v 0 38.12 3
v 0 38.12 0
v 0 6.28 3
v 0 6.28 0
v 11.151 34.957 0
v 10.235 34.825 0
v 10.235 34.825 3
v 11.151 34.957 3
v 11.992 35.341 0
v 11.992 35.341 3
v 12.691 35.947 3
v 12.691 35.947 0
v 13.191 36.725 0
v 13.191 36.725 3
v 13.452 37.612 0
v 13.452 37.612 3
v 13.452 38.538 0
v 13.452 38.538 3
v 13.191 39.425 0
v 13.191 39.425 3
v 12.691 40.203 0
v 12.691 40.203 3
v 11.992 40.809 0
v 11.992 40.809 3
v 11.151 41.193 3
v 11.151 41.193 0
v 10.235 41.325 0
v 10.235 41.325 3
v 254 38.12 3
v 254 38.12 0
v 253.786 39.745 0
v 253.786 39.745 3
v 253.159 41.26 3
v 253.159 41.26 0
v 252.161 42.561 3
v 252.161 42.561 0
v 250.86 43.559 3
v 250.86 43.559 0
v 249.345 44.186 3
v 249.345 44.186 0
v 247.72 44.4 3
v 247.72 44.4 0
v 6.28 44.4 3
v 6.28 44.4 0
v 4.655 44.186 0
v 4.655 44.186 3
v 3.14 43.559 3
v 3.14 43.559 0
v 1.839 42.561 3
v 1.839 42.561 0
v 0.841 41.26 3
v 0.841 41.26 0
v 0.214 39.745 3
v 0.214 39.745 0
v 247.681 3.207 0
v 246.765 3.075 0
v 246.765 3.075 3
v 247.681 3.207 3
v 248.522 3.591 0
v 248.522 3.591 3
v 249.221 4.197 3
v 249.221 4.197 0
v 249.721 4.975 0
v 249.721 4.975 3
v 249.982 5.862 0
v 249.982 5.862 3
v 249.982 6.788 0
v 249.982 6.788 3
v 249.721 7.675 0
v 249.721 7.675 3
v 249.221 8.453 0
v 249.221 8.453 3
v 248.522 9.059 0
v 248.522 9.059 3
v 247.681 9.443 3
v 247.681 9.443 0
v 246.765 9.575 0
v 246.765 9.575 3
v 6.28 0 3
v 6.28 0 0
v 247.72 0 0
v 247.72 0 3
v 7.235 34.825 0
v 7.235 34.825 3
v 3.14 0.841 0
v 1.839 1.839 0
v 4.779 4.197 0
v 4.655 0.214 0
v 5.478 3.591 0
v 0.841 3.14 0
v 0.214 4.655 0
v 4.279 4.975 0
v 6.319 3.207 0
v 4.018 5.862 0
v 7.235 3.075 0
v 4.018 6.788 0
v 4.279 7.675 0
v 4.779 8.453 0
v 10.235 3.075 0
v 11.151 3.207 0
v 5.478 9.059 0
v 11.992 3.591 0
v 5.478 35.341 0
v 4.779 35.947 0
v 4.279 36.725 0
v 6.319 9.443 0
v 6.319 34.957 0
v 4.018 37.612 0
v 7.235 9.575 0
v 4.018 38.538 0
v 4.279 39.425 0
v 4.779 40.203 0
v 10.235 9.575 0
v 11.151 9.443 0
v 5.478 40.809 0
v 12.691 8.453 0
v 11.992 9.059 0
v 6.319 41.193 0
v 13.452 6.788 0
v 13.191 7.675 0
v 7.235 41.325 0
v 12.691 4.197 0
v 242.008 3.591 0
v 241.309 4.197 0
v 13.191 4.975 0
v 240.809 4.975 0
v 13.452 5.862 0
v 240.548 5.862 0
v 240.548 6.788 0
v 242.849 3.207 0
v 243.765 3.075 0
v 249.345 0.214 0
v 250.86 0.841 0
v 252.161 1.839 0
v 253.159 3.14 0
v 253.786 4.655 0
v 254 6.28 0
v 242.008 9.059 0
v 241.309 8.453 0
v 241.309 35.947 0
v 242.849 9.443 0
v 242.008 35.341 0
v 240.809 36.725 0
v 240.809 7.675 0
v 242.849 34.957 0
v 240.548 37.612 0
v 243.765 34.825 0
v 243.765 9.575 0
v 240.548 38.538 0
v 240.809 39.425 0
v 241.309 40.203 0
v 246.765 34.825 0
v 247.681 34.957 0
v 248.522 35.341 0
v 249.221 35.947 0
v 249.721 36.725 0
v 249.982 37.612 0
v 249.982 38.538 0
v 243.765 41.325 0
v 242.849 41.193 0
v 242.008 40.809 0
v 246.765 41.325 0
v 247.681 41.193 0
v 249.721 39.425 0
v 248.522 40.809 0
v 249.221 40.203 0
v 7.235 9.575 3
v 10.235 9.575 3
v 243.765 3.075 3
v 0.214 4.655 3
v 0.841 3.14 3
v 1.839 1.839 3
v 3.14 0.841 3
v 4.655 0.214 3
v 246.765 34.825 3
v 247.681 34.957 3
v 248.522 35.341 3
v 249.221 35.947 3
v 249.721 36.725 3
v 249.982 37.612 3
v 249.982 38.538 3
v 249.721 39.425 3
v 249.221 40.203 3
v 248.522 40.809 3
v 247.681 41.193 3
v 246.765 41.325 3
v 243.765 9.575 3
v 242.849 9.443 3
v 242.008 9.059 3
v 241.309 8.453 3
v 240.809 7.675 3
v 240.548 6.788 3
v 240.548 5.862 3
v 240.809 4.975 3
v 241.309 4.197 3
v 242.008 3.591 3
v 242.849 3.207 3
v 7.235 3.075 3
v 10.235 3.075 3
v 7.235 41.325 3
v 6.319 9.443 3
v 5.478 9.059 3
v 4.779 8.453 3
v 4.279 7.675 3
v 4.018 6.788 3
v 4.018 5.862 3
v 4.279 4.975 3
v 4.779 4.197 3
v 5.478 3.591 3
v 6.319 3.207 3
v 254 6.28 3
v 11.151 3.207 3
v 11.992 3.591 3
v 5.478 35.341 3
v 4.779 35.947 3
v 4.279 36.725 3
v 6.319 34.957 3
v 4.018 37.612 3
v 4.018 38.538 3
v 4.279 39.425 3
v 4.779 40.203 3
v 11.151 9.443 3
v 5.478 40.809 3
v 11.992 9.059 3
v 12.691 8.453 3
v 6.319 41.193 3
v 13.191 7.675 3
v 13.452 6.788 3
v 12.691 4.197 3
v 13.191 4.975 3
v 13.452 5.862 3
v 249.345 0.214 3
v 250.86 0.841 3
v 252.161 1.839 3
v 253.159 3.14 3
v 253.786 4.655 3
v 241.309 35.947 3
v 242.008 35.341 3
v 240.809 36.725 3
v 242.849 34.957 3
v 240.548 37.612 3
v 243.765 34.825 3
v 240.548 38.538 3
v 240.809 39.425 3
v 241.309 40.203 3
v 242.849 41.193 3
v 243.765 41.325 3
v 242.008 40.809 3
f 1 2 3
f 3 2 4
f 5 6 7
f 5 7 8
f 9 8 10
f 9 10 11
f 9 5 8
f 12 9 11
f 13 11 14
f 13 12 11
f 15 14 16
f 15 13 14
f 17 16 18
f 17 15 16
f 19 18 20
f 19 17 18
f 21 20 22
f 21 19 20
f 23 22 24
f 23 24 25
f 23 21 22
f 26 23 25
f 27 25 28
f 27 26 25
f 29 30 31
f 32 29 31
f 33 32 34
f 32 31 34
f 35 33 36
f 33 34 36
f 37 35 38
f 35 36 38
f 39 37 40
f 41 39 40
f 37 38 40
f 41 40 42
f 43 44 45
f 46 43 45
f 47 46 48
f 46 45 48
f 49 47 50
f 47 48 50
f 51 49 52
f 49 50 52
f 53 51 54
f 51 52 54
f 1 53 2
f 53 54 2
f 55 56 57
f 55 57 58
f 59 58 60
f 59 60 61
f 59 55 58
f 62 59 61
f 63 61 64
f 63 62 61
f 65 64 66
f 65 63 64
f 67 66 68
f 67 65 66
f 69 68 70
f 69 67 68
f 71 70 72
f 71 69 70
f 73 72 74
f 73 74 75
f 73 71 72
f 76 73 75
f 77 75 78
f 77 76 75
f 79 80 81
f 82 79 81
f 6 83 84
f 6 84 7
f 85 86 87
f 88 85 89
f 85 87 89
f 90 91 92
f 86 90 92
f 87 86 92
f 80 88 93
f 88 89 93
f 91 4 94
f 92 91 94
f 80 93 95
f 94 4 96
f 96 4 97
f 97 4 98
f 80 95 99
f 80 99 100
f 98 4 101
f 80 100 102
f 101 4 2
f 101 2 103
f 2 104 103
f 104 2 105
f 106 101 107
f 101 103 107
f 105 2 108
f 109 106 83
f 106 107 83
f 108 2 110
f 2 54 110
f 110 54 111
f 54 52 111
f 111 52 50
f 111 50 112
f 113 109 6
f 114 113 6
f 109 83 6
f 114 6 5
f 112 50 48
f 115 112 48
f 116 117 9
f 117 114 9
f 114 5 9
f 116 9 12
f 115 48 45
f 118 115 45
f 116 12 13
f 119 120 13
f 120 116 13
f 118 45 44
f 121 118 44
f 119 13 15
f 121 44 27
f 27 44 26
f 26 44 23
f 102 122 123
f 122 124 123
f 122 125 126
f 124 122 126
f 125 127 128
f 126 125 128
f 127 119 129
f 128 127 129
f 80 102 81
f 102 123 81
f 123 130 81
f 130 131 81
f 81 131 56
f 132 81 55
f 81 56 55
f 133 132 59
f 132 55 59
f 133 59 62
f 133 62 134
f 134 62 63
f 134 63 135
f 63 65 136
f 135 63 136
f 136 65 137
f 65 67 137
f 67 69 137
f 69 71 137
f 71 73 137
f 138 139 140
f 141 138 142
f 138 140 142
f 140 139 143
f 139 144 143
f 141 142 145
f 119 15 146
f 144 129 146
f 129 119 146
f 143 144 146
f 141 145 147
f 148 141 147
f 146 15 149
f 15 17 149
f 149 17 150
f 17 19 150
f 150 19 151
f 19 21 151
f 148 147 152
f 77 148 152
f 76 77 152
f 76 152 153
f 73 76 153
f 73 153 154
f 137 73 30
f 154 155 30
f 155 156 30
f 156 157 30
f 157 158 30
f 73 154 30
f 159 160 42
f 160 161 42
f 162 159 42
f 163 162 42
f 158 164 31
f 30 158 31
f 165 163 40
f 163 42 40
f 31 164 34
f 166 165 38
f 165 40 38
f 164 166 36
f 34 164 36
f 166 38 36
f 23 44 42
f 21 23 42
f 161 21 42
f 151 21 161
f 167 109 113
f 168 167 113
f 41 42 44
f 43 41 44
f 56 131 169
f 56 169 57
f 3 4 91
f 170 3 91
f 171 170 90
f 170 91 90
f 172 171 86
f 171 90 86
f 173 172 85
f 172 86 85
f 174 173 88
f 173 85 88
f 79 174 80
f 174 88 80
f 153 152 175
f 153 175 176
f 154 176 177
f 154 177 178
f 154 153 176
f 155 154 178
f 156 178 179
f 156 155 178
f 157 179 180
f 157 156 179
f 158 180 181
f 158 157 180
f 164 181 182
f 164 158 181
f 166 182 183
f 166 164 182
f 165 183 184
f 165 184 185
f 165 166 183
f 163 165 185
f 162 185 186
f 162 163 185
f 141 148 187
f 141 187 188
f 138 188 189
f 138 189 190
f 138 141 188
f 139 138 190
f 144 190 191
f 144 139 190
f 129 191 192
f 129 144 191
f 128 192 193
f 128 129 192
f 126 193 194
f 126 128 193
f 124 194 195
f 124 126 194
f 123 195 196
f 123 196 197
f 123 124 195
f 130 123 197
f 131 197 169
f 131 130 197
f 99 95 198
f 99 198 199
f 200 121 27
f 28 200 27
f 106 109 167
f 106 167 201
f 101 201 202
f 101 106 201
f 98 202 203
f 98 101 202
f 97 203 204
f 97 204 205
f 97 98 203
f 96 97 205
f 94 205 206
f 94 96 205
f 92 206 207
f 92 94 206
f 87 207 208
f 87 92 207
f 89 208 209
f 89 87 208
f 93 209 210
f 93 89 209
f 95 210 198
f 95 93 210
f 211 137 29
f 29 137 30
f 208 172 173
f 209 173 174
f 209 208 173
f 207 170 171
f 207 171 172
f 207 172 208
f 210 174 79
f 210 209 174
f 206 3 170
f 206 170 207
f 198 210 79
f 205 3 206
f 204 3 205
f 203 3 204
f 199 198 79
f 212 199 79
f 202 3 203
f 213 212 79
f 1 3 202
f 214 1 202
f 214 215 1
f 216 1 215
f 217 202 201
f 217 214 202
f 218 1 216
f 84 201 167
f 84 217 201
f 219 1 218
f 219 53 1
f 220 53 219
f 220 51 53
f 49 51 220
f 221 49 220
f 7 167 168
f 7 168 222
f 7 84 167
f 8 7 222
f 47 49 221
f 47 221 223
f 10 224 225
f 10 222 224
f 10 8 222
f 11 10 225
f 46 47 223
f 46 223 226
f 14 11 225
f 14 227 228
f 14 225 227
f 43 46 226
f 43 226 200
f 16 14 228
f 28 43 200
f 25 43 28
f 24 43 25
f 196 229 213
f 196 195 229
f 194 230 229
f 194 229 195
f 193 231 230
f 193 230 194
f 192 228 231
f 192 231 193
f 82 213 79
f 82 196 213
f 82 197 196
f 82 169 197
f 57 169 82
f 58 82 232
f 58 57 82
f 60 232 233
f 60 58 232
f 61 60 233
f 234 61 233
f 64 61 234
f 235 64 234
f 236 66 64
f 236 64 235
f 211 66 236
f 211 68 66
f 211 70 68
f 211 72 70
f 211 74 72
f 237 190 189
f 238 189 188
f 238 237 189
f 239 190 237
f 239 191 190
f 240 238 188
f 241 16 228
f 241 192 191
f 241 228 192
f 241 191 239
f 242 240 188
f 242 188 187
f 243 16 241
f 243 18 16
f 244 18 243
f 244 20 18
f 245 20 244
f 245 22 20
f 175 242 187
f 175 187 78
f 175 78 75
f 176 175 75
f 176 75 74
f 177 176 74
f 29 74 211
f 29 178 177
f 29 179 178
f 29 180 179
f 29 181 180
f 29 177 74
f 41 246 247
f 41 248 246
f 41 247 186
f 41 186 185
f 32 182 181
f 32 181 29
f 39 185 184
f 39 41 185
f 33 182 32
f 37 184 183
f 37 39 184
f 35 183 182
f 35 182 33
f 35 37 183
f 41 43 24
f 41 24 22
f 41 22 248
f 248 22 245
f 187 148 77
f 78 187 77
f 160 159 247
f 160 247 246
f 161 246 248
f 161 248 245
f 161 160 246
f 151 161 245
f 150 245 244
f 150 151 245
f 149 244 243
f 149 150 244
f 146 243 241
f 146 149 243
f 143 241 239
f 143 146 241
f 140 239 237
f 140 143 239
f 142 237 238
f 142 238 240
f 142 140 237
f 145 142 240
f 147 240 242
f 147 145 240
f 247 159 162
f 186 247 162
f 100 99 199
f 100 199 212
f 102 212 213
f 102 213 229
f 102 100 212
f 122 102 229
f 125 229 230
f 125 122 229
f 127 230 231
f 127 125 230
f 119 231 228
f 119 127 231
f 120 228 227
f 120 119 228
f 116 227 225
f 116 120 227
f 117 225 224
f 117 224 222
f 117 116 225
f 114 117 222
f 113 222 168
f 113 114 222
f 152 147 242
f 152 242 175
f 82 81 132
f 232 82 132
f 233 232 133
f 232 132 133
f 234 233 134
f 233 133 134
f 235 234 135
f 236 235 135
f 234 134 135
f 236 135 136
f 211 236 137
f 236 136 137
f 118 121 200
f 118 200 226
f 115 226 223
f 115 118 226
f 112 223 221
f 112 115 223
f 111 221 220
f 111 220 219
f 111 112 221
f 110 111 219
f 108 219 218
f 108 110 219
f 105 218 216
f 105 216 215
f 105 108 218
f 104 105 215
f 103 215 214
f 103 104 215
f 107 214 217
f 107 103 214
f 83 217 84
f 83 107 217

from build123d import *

# Parameters (mm, degrees)
PAD_DEPTH = 3


with BuildPart() as part:
    # Sketch (on XY_Plane of Origin) → Pad (new body)
    with BuildSketch(Plane.XY):
        with BuildLine():
            Line((6.28, 0), (247.72, 0))
            ThreePointArc((247.72, 0), (252.160631, 1.839369), (254, 6.28))
            Line((254, 6.28), (254, 38.12))
            ThreePointArc((254, 38.12), (252.160631, 42.560631), (247.72, 44.4))
            Line((247.72, 44.4), (6.28, 44.4))
            ThreePointArc((6.28, 44.4), (1.839369, 42.560631), (0, 38.12))
            Line((0, 38.12), (0, 6.28))
            ThreePointArc((0, 6.28), (1.839369, 1.839369), (6.28, 0))
        make_face()
        with BuildLine():
            ThreePointArc((243.765, 9.575), (240.515, 6.325), (243.765, 3.075))
            Line((243.765, 3.075), (246.765, 3.075))
            ThreePointArc((246.765, 3.075), (250.015, 6.325), (246.765, 9.575))
            Line((243.765, 9.575), (246.765, 9.575))
        make_face(mode=Mode.SUBTRACT)
        with BuildLine():
            ThreePointArc((243.765, 41.325), (240.515, 38.075), (243.765, 34.825))
            Line((243.765, 34.825), (246.765, 34.825))
            ThreePointArc((246.765, 34.825), (250.015, 38.075), (246.765, 41.325))
            Line((243.765, 41.325), (246.765, 41.325))
        make_face(mode=Mode.SUBTRACT)
        with BuildLine():
            ThreePointArc((7.235, 9.575), (3.985, 6.325), (7.235, 3.075))
            Line((7.235, 3.075), (10.235, 3.075))
            ThreePointArc((10.235, 3.075), (13.485, 6.325), (10.235, 9.575))
            Line((7.235, 9.575), (10.235, 9.575))
        make_face(mode=Mode.SUBTRACT)
        with BuildLine():
            ThreePointArc((7.235, 41.325), (3.985, 38.075), (7.235, 34.825))
            Line((7.235, 34.825), (10.235, 34.825))
            ThreePointArc((10.235, 34.825), (13.485, 38.075), (10.235, 41.325))
            Line((7.235, 41.325), (10.235, 41.325))
        make_face(mode=Mode.SUBTRACT)
    extrude(amount=PAD_DEPTH)


solid = part.part
